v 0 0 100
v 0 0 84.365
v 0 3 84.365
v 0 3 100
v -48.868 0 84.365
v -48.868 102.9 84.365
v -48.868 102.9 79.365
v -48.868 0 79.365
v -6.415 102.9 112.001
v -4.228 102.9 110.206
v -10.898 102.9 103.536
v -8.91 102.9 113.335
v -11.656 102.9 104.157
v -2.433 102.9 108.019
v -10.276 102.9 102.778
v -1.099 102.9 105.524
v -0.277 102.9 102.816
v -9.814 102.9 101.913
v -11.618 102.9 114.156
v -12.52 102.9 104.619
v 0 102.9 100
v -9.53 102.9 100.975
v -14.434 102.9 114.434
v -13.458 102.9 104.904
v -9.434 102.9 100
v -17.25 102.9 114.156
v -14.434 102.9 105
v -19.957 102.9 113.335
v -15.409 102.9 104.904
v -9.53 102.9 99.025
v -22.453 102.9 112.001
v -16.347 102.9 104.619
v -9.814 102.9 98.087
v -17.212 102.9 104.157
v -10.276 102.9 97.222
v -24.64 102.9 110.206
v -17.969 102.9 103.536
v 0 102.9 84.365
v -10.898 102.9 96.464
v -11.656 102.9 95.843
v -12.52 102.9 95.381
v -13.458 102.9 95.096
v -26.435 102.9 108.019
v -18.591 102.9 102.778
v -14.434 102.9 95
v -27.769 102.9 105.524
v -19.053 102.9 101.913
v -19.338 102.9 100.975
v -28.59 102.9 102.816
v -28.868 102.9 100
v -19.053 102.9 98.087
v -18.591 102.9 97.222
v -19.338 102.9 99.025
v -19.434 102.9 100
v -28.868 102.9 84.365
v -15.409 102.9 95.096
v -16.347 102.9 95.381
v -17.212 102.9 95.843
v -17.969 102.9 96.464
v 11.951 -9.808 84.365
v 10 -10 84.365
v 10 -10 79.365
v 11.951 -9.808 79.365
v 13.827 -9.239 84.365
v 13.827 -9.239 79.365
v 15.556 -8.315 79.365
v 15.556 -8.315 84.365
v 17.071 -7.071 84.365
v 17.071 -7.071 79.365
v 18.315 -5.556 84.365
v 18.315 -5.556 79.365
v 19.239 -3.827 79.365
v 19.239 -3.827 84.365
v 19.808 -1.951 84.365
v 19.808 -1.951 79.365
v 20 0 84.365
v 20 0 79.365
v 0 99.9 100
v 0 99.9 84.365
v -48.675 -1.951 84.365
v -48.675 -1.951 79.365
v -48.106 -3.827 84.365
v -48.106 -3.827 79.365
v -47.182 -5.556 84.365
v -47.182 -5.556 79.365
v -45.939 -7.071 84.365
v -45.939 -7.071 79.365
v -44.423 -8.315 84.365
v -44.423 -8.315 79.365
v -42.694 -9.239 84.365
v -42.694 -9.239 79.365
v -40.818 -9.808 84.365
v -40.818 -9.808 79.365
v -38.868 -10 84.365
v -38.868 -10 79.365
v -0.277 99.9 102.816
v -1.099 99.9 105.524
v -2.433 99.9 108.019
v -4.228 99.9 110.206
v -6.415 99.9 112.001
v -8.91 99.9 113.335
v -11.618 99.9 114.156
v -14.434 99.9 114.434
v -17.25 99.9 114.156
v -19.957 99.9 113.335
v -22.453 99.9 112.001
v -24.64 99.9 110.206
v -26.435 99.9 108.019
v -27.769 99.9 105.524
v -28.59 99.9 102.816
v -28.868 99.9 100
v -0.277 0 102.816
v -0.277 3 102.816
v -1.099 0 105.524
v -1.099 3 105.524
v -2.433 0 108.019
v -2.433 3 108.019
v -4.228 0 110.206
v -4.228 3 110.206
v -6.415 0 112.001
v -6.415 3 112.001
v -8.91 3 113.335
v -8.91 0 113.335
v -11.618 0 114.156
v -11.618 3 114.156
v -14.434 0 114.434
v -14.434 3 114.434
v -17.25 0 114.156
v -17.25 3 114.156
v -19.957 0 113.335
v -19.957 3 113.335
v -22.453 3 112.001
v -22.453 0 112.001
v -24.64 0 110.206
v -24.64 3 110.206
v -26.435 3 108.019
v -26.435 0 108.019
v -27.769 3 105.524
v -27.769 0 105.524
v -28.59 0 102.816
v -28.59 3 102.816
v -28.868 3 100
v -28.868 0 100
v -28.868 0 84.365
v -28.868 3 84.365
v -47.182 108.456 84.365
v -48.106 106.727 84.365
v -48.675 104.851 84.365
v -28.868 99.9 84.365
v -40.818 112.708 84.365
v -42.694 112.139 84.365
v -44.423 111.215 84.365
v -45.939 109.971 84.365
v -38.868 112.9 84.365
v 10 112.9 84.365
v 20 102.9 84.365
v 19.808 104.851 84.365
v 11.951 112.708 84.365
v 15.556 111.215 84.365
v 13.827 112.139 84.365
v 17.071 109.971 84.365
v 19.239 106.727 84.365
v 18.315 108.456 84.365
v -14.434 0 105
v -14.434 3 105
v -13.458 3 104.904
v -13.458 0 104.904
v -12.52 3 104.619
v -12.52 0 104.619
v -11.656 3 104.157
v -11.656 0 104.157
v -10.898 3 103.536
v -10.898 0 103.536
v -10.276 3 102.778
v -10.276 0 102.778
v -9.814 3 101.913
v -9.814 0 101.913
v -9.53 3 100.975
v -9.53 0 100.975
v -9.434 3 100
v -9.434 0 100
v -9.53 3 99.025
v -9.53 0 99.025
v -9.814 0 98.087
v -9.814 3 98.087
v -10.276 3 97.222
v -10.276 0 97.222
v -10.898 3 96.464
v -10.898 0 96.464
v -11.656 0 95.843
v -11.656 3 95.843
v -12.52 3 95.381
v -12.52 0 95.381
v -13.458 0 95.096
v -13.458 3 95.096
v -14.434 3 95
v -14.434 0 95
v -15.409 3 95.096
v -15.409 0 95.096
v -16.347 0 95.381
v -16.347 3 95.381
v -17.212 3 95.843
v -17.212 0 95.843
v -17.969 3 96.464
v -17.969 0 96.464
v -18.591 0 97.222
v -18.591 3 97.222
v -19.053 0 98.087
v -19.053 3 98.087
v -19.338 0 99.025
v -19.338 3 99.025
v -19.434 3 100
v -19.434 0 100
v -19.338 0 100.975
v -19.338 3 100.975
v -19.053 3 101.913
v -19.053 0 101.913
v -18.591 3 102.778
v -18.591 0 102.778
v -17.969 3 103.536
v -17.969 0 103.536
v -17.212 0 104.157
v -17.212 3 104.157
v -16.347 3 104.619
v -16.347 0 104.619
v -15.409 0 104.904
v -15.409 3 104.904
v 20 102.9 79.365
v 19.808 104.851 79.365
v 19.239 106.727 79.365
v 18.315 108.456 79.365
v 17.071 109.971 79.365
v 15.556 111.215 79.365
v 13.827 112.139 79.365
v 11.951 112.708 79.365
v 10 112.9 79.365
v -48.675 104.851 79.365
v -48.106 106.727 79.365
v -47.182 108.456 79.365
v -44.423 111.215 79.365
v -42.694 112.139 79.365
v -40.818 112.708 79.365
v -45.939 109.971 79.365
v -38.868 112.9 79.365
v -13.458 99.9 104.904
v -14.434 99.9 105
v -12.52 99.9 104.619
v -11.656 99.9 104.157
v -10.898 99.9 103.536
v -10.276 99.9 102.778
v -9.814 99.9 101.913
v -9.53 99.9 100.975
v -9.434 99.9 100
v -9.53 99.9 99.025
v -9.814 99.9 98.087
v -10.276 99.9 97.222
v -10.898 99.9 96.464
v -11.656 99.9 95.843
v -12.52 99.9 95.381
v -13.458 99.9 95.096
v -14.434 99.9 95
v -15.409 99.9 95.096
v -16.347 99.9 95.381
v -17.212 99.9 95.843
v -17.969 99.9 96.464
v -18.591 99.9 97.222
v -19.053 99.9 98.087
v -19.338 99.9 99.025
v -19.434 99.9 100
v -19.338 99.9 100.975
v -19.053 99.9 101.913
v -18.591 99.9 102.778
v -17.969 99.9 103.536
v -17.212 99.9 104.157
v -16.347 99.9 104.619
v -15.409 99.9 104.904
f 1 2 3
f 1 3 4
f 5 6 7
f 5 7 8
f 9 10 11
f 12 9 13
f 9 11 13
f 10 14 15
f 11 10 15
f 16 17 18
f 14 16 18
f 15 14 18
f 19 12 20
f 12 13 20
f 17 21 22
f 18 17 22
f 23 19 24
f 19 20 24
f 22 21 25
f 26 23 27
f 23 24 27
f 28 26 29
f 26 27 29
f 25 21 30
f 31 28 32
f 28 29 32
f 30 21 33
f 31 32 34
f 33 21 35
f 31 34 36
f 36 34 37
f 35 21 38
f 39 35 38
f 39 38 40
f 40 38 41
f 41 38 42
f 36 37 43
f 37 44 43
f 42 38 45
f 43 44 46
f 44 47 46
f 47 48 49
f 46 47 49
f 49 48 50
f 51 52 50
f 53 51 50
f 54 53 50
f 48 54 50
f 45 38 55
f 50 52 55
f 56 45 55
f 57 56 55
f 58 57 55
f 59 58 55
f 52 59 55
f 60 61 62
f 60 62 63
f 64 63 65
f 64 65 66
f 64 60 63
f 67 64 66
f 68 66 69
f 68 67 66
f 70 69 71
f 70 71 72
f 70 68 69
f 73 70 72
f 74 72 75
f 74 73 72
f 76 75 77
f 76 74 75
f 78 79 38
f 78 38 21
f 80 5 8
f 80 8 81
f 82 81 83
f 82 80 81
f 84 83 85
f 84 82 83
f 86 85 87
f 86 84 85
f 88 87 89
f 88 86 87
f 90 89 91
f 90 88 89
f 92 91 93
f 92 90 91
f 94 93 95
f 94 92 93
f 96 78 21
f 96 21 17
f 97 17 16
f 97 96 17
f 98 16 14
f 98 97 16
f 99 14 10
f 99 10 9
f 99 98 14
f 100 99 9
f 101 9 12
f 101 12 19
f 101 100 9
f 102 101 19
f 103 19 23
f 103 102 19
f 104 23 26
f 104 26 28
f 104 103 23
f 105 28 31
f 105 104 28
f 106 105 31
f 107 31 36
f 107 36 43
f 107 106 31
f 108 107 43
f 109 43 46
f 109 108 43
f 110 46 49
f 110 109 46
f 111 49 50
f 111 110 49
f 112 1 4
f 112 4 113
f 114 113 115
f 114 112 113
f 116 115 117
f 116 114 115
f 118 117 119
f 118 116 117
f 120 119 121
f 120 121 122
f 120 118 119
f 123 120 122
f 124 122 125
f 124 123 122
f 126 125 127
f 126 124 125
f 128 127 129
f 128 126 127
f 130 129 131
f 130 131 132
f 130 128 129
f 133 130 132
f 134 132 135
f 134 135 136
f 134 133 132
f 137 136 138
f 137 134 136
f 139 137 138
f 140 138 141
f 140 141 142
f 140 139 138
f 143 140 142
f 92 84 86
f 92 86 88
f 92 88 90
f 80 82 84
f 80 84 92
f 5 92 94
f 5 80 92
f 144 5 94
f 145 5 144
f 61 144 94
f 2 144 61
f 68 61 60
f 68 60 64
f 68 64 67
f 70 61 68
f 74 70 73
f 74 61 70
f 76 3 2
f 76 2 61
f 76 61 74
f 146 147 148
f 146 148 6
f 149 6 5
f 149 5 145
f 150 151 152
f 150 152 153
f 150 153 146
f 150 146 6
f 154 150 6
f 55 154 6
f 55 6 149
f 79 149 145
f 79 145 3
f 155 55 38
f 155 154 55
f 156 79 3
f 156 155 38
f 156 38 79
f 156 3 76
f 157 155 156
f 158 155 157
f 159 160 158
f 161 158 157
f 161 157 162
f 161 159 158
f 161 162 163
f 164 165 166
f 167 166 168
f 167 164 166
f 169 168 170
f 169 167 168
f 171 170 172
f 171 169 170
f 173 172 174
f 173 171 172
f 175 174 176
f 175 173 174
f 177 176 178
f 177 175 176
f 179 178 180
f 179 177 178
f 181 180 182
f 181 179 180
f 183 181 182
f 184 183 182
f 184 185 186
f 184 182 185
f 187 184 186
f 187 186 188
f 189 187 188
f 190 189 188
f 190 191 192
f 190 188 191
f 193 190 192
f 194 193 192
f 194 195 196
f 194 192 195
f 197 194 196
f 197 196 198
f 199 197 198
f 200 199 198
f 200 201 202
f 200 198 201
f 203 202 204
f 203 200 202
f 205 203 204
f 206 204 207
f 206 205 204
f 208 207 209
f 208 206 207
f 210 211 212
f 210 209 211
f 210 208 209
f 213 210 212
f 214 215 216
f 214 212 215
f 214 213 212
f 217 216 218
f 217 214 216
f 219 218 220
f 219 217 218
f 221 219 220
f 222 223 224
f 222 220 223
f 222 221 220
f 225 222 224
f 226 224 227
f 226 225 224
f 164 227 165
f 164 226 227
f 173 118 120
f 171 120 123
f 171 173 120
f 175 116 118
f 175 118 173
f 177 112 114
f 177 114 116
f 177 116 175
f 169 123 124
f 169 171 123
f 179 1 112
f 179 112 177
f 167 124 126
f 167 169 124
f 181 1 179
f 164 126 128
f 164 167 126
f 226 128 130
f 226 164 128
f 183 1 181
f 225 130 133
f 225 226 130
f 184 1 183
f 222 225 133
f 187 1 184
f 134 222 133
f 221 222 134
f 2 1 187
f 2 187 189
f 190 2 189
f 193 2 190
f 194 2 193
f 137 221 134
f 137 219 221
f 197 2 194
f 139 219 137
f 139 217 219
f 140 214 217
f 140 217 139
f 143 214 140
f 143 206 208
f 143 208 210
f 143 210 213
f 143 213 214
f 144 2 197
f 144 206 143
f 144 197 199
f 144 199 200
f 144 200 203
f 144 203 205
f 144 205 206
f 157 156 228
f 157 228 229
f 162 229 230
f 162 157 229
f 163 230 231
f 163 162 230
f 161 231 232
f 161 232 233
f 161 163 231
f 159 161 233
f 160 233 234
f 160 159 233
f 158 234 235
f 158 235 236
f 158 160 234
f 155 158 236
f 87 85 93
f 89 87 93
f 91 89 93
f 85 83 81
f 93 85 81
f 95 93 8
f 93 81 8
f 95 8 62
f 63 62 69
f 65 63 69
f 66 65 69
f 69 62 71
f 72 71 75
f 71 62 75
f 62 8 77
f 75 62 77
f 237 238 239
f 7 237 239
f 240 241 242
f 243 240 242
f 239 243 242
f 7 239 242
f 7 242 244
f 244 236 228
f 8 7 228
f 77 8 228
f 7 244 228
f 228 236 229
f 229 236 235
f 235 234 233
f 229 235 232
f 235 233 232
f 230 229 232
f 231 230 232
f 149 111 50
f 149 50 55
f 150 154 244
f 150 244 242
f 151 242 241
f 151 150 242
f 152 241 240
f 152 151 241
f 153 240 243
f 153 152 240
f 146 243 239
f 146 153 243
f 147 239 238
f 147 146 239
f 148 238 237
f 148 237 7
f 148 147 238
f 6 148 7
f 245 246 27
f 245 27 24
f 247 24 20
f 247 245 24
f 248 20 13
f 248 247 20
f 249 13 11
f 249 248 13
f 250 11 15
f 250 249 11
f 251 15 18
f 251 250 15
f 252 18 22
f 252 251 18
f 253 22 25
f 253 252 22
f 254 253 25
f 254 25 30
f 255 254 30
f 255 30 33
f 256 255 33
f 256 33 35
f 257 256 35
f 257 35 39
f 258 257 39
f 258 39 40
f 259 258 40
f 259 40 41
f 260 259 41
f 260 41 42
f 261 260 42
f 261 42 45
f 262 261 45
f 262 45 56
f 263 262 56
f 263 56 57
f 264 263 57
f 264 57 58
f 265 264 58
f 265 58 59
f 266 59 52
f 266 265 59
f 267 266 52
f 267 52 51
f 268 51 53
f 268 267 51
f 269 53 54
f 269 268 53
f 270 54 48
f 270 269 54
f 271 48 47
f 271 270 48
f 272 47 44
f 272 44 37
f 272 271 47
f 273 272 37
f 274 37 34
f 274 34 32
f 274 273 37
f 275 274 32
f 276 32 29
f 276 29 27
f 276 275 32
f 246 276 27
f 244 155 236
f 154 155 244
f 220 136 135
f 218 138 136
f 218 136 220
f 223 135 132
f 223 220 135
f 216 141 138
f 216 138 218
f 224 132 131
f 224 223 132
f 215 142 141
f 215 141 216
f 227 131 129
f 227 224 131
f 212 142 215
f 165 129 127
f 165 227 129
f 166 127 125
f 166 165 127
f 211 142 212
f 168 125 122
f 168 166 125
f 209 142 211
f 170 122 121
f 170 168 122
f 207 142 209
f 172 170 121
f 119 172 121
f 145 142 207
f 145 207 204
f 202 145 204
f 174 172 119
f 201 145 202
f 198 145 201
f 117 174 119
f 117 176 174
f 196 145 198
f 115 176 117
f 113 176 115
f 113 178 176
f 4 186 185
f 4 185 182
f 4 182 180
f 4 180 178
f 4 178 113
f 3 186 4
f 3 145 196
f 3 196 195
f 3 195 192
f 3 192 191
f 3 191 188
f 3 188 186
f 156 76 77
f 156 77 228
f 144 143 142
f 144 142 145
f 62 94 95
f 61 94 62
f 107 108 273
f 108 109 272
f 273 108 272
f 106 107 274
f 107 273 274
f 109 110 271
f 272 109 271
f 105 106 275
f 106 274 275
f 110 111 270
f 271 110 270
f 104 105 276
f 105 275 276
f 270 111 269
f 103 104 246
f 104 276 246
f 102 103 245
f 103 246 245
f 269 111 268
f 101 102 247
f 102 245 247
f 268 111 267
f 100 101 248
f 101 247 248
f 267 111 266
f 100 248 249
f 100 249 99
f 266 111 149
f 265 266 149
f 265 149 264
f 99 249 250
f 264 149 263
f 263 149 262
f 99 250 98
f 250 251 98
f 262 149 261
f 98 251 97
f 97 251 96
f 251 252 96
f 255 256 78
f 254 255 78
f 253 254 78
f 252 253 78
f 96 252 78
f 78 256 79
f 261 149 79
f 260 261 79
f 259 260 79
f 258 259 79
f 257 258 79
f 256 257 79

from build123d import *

# Parameters (mm, degrees)
SKETCH1_R           = 5
BOSS_EXTRUDE1_DEPTH = 102.9
SKETCH2_W           = 28.867513459
SKETCH2_H           = 96.9
CUT_EXTRUDE1_DEPTH  = 217
BOSS_EXTRUDE2_DEPTH = 5


with BuildPart() as part:
    # Sketch1 → Boss-Extrude1 (new body)
    with BuildSketch(Plane(origin=(0, 0, 0), x_dir=(1, 0, 0), z_dir=(0, 1, 0))):
        with BuildLine():
            Line((-28.867513459, -84.364700653), (0, -84.364700653))
            Line((0, -84.364700653), (0, -100))
            ThreePointArc((0, -100), (-14.43375673, -114.43375673), (-28.867513459, -100))
            Line((-28.867513459, -100), (-28.867513459, -84.364700653))
        make_face()
        with Locations(Location((-14.43375673, -100, 0), (0, 0, 270))):
            Circle(SKETCH1_R, mode=Mode.SUBTRACT)
    extrude(amount=BOSS_EXTRUDE1_DEPTH)

    # Sketch2 → Cut-Extrude1 (cut)
    with BuildSketch(Plane.XY):
        with Locations((-14.43375673, 51.45)):
            Rectangle(SKETCH2_W, SKETCH2_H)
    extrude(amount=CUT_EXTRUDE1_DEPTH, mode=Mode.SUBTRACT)


with BuildPart() as cut_extrude1_piece_1:
    # of the separate pieces the step leaves, piece 1, a body of its own (cut_extrude1_pieces)
    add(part.part.solids().sort_by_distance((-28.867513459, 0, 100))[0])



with BuildPart() as cut_extrude1_piece_2:
    # of the separate pieces the step leaves, piece 2, a body of its own (cut_extrude1_pieces)
    add(part.part.solids().sort_by_distance((-28.867513459, 99.9, 84.364700653))[0])


with BuildPart() as cut_extrude1_piece_1_1:
    add(cut_extrude1_piece_1.part)

    add(cut_extrude1_piece_2.part)  # Boss-Extrude2 merges Cut-Extrude1 piece 2
    # Sketch5 → Boss-Extrude2 (add)
    with BuildSketch(Plane(origin=(0, 0, 84.364700653), x_dir=(-1, 0, 0), z_dir=(0, 0, -1))):
        with BuildLine():
            Line((-10, 112.9), (38.867513459, 112.9))
            ThreePointArc((38.867513459, 112.9), (45.938581271, 109.971067812), (48.867513459, 102.9))
            Line((48.867513459, 102.9), (48.867513459, 0))
            ThreePointArc((48.867513459, 0), (45.938581271, -7.071067812), (38.867513459, -10))
            Line((38.867513459, -10), (-10, -10))
            ThreePointArc((-10, -10), (-17.071067812, -7.071067812), (-20, 0))
            Line((-20, 0), (-20, 102.9))
            ThreePointArc((-20, 102.9), (-17.071067812, 109.971067812), (-10, 112.9))
        make_face()
    extrude(amount=BOSS_EXTRUDE2_DEPTH)


solid = cut_extrude1_piece_1_1.part
